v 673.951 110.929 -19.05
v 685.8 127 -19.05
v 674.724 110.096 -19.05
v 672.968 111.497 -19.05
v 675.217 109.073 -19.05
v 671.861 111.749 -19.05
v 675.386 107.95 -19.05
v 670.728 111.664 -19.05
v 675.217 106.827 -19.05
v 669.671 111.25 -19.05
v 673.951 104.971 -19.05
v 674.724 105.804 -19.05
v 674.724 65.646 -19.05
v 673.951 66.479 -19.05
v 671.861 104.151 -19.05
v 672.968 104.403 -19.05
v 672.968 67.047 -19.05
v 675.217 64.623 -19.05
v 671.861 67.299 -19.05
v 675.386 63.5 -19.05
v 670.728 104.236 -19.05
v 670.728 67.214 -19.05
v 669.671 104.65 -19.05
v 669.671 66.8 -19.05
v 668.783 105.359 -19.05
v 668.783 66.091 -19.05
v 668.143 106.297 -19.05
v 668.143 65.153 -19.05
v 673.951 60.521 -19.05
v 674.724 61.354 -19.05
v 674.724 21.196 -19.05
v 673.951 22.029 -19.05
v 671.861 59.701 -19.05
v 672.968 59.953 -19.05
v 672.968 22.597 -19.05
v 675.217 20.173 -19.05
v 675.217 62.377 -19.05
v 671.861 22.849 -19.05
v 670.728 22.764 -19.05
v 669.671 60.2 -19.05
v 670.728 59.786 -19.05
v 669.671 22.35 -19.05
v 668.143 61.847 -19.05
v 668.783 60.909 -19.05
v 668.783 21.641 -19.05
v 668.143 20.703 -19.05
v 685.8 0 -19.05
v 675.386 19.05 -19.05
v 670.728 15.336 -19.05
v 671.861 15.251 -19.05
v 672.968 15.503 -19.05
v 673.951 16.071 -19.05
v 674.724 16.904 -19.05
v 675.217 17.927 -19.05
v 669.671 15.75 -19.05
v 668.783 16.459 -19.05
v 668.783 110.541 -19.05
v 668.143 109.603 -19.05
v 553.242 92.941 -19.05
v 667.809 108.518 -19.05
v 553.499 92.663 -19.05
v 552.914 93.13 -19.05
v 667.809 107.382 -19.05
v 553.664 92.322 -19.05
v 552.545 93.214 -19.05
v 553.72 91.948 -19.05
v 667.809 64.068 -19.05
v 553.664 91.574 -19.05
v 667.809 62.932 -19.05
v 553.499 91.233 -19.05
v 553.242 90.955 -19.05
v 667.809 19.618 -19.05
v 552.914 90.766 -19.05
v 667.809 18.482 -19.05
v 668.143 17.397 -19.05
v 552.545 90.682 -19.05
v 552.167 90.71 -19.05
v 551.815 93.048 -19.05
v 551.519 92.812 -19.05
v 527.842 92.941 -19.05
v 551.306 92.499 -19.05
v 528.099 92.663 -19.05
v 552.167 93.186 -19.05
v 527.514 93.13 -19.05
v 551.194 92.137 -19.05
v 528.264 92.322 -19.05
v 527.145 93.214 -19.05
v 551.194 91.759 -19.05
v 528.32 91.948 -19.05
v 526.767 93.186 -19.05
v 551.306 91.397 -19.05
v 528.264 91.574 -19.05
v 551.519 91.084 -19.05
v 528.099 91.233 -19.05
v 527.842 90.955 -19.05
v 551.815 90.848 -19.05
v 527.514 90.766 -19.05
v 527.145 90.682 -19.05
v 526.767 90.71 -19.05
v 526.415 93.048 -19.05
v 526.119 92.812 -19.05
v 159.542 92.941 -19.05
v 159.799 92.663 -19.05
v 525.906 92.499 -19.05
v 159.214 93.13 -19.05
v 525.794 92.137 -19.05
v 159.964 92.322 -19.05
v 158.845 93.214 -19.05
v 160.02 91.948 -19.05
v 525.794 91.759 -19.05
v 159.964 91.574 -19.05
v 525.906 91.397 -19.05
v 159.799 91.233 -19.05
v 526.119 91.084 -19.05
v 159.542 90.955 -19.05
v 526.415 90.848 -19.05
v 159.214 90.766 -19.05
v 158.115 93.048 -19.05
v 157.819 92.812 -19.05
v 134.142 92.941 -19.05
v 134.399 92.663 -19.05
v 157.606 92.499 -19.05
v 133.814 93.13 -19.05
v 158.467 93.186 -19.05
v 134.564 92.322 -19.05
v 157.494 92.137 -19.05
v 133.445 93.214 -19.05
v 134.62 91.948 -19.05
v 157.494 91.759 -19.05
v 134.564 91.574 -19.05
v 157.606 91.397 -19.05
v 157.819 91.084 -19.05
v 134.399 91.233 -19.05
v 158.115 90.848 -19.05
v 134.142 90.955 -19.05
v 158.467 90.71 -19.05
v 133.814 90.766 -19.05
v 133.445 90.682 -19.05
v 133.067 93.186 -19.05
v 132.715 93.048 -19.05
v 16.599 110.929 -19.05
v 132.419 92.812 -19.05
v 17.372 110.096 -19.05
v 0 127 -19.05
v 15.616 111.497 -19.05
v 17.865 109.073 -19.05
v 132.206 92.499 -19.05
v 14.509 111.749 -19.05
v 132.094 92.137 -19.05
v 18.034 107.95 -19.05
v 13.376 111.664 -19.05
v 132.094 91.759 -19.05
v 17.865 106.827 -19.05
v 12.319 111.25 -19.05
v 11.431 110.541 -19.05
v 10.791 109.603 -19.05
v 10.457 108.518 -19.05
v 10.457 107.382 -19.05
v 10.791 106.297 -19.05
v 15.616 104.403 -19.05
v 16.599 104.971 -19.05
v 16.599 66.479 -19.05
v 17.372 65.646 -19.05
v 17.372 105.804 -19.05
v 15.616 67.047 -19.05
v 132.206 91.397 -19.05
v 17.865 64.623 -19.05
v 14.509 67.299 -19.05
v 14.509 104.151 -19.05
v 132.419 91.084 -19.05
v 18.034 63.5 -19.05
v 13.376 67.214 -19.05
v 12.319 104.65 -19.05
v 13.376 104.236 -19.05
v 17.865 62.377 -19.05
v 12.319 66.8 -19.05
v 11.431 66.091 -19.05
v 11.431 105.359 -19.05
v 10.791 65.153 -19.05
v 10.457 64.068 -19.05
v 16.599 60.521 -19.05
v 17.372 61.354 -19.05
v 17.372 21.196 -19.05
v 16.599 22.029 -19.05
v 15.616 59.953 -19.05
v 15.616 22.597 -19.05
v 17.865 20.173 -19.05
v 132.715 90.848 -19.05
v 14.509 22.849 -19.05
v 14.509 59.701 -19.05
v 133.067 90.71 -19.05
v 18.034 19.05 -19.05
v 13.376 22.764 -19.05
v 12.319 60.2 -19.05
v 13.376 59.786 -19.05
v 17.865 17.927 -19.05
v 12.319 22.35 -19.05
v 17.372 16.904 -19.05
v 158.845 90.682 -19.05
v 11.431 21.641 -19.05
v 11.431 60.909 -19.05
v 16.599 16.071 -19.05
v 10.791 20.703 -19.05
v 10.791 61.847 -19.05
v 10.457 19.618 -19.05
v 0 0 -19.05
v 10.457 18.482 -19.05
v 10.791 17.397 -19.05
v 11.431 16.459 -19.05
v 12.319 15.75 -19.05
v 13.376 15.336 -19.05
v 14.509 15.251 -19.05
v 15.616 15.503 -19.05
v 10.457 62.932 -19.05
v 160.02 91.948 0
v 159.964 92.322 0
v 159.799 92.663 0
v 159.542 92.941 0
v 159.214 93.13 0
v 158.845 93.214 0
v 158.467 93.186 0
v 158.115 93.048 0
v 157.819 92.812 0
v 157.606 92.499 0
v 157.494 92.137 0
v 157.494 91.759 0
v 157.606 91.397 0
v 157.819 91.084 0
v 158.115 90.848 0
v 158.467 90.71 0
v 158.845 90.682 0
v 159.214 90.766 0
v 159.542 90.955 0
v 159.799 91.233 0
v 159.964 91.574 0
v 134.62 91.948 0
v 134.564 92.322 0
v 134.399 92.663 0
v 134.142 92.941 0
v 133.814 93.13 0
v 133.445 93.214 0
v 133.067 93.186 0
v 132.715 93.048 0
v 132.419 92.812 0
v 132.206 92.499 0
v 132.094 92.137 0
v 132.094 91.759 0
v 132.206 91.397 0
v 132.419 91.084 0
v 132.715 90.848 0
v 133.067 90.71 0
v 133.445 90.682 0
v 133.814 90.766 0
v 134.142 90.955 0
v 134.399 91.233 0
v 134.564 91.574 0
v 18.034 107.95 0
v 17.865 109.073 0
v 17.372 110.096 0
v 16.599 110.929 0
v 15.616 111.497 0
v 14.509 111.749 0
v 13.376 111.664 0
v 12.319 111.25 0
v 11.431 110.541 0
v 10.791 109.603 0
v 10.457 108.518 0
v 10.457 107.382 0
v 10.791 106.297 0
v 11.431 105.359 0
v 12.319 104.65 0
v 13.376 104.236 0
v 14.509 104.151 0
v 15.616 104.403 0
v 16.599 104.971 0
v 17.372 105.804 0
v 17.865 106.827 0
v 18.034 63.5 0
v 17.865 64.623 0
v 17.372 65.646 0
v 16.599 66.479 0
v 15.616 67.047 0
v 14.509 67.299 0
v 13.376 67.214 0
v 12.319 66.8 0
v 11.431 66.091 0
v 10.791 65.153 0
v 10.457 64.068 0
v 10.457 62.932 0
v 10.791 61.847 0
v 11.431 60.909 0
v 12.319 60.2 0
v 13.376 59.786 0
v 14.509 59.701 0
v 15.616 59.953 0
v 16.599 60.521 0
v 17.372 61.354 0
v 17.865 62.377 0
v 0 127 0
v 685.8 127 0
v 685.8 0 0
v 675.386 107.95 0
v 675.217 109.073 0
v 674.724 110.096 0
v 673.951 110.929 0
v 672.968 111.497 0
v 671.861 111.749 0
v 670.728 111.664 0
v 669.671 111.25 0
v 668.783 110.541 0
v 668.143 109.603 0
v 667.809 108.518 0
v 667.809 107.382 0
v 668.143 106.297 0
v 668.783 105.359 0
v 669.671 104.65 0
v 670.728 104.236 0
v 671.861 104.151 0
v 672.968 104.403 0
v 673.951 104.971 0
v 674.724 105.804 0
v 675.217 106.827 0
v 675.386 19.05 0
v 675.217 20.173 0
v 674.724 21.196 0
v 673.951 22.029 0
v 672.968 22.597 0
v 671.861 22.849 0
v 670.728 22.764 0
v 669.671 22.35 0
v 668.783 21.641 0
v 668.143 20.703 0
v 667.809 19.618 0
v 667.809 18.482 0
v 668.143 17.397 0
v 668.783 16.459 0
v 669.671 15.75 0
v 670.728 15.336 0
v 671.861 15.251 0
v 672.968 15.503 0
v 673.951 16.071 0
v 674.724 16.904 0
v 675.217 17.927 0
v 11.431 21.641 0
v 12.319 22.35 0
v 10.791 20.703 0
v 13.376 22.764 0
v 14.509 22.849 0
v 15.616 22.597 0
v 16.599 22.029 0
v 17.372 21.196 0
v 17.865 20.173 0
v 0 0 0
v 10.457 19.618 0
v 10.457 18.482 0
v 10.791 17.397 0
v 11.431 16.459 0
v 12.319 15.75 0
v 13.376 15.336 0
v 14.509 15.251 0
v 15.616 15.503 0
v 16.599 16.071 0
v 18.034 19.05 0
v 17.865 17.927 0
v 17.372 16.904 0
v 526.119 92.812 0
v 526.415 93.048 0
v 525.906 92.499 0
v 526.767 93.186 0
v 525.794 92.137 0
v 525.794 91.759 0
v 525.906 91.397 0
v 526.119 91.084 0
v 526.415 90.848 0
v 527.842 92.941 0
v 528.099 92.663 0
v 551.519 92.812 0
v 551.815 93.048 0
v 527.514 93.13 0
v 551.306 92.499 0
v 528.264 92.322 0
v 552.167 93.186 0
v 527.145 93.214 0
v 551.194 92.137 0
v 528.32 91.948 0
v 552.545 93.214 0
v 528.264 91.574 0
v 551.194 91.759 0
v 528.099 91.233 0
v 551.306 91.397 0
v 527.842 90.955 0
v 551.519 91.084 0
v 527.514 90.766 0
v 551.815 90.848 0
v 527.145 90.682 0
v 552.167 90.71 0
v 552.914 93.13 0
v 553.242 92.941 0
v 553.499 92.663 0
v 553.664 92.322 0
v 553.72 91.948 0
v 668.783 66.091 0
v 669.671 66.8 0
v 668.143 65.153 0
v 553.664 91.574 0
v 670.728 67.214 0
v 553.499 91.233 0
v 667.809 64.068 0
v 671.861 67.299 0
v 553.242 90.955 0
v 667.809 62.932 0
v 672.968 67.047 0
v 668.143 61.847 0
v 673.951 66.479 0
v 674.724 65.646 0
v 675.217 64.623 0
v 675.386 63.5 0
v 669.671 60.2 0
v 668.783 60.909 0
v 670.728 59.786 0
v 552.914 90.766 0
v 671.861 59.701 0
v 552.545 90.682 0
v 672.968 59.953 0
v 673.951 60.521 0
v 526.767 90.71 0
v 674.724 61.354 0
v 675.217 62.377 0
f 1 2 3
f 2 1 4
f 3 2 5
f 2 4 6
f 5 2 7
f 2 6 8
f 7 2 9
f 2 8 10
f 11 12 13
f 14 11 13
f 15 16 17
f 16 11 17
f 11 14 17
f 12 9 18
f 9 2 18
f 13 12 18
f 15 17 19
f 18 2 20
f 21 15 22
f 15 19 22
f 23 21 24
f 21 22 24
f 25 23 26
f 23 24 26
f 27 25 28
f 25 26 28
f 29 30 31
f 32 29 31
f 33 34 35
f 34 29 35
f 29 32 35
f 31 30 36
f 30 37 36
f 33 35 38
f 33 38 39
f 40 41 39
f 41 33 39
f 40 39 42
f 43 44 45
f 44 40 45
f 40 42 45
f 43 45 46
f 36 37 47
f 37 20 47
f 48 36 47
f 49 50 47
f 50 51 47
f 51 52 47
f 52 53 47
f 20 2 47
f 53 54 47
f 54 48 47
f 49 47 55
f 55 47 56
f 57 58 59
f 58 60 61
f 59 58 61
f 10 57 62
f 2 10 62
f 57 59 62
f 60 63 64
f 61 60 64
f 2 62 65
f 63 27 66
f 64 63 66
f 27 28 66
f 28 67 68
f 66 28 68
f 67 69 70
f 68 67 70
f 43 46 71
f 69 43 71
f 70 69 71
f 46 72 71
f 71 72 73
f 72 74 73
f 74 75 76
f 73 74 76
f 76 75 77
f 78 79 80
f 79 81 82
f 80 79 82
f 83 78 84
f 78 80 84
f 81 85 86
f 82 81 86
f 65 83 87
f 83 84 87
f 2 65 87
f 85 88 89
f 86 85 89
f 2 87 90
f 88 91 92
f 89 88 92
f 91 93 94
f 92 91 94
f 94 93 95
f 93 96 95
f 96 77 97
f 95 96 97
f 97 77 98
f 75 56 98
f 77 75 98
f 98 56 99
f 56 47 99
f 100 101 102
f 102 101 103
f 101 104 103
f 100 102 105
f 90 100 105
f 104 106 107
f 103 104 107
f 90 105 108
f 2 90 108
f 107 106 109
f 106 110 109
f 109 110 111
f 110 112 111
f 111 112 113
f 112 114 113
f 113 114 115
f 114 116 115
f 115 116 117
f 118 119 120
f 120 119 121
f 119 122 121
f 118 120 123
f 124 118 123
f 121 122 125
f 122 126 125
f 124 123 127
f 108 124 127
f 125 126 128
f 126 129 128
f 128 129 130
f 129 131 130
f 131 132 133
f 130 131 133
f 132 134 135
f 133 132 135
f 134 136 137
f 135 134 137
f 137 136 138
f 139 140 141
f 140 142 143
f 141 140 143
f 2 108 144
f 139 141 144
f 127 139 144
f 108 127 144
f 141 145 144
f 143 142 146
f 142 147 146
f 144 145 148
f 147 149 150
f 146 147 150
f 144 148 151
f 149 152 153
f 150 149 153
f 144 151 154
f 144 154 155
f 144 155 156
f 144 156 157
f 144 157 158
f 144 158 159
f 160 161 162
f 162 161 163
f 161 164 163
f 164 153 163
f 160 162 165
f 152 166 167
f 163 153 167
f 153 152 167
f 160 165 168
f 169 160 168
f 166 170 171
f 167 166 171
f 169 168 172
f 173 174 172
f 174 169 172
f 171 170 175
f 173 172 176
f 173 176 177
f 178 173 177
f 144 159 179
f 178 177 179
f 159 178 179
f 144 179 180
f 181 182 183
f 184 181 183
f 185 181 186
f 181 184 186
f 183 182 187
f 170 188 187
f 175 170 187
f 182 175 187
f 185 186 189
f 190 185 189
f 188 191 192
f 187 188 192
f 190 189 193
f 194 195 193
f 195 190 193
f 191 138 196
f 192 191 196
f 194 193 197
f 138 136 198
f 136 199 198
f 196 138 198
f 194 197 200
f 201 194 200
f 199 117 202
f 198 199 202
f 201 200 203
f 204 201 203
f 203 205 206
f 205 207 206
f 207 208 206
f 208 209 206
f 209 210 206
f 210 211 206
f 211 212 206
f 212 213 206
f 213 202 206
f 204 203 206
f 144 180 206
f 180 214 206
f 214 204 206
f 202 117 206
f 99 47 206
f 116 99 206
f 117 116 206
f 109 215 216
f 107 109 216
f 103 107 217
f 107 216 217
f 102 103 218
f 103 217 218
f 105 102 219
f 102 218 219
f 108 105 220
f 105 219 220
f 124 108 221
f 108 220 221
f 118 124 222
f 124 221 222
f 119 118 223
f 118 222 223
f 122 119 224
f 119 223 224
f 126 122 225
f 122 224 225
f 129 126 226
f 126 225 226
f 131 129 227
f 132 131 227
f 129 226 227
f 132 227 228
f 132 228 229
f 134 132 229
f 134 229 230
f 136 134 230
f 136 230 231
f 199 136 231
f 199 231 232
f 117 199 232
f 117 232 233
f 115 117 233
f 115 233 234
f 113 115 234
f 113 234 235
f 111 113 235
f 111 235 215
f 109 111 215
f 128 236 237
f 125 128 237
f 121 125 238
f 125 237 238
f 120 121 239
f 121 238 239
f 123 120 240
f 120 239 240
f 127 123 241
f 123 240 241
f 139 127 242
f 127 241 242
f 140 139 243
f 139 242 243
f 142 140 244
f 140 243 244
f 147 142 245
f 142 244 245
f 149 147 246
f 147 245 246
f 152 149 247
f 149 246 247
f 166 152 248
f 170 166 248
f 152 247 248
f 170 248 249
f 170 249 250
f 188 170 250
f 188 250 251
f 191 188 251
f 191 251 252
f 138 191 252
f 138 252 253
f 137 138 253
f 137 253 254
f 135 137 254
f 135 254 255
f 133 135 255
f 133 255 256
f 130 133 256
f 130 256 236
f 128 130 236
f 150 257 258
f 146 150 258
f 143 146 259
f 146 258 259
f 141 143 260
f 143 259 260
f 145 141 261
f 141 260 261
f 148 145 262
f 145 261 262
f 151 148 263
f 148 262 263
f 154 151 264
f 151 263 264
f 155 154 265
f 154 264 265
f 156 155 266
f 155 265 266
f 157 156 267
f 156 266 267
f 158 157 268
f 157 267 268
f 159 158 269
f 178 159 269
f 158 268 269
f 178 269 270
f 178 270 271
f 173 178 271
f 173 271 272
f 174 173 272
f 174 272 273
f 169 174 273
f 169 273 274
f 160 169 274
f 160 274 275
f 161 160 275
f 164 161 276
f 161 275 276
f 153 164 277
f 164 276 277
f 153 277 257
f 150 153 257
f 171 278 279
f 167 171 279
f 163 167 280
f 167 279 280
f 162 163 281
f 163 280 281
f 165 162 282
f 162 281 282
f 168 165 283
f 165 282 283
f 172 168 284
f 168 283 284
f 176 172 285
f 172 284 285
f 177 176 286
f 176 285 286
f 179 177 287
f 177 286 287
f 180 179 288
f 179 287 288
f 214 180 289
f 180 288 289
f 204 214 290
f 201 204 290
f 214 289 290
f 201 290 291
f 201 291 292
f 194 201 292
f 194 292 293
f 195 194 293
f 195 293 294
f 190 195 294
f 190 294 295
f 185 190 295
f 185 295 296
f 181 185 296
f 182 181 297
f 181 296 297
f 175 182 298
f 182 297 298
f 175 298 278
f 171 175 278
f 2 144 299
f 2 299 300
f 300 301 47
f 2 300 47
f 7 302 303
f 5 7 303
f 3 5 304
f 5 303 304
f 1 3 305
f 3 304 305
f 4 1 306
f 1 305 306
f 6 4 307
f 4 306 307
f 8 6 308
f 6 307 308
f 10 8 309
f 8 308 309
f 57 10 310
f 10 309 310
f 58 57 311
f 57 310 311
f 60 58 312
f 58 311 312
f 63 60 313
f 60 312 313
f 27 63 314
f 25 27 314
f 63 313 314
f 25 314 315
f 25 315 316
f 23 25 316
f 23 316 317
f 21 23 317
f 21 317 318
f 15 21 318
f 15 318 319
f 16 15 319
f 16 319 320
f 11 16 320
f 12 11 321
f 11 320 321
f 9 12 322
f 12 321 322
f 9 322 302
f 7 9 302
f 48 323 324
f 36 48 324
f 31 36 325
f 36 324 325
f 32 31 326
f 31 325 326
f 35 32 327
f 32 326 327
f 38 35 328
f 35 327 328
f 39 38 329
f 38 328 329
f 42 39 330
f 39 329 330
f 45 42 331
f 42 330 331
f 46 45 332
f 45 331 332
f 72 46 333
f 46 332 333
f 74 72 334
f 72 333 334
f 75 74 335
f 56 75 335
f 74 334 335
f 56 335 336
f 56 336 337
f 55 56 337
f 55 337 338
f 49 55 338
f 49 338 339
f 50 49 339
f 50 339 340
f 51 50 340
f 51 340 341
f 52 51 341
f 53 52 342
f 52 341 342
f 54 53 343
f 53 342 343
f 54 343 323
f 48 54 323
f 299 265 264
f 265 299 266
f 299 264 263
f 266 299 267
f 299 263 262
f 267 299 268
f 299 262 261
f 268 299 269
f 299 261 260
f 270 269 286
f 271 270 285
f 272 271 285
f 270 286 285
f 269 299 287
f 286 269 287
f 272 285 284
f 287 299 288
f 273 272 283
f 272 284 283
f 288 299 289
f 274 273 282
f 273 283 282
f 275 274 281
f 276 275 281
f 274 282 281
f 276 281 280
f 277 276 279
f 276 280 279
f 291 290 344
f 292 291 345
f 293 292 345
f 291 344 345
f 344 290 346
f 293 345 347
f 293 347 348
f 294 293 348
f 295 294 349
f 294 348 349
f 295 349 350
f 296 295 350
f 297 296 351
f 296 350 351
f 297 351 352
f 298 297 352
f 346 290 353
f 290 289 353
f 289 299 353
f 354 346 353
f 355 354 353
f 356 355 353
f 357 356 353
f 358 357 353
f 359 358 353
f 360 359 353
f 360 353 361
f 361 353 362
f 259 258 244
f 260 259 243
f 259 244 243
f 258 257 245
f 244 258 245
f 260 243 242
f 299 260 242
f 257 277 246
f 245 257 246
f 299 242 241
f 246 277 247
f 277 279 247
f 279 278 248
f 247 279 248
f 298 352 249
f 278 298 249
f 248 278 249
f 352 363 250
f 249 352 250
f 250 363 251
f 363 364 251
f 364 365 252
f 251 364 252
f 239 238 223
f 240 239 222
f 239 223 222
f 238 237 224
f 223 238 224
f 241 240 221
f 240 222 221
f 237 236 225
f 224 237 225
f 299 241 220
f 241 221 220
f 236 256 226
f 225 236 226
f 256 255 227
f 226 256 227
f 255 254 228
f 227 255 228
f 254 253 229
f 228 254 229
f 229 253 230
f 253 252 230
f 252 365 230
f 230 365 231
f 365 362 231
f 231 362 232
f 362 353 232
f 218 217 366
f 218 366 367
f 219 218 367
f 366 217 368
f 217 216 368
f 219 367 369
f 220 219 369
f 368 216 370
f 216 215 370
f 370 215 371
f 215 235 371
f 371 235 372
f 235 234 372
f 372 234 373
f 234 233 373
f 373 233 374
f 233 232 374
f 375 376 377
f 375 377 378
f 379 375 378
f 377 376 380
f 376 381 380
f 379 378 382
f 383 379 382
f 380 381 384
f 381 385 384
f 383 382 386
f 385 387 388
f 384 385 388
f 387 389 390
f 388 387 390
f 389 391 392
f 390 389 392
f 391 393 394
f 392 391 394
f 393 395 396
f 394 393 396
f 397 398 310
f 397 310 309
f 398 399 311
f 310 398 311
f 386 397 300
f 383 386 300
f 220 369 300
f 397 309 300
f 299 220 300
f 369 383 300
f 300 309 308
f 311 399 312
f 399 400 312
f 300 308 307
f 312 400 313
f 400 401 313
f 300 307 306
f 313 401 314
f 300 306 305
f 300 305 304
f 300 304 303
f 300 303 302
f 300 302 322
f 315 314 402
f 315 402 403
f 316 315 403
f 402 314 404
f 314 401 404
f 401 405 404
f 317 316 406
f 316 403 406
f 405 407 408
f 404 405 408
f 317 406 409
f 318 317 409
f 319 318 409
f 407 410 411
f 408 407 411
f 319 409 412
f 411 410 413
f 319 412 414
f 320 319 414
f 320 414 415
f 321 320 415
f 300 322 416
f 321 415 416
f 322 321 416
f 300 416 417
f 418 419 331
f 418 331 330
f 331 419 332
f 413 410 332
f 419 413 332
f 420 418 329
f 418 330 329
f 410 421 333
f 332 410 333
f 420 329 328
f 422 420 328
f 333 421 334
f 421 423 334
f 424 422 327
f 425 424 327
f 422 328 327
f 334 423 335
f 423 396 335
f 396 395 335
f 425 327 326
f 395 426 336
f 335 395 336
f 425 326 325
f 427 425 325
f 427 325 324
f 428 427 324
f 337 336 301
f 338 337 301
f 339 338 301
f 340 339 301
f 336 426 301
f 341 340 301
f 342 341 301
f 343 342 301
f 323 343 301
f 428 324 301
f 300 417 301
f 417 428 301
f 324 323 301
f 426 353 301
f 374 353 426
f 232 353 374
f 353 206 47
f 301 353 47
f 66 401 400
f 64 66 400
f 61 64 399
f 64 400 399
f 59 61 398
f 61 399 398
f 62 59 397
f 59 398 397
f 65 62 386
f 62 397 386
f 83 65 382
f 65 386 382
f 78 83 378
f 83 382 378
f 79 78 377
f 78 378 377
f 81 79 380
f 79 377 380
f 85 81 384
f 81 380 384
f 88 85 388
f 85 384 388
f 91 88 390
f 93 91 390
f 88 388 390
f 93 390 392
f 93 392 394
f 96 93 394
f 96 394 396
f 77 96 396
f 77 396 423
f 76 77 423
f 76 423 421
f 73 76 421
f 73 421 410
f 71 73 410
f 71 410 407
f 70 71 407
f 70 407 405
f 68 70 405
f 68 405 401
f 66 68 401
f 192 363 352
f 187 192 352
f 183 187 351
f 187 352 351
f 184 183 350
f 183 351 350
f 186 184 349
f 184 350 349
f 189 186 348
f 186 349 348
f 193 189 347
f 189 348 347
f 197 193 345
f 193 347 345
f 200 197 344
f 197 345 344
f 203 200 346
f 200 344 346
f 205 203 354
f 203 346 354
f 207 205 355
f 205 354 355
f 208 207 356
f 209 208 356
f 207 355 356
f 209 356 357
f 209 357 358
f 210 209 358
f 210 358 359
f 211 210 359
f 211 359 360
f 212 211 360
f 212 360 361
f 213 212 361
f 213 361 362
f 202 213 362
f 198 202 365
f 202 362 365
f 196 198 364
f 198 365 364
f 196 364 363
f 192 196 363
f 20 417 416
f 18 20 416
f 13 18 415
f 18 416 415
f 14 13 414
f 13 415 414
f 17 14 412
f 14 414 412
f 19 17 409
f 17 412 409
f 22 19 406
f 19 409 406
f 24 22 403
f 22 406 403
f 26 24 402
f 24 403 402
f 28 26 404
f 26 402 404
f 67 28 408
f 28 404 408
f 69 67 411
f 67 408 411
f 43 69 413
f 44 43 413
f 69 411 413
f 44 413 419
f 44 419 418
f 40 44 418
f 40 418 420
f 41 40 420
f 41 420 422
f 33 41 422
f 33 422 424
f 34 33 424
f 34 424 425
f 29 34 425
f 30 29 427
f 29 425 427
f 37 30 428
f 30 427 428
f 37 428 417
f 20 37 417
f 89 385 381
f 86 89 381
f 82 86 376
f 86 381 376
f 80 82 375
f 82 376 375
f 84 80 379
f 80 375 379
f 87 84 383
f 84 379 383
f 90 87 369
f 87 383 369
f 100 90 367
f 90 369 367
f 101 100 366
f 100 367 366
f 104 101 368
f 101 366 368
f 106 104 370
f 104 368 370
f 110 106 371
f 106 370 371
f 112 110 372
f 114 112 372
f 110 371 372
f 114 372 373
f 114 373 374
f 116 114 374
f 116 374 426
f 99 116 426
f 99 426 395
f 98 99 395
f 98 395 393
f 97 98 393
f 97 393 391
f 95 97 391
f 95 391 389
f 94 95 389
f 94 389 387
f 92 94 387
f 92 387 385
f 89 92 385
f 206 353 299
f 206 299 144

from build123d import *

# Parameters (mm, degrees)
SKETCH3_W           = 647.7
SKETCH3_H           = 19.05
SKETCH3_W_2         = 19.05
BOSS_EXTRUDE1_DEPTH = 127
SKETCH4_R           = 3.81
CUT_EXTRUDE1_DEPTH  = 19.05
SKETCH5_R           = 1.27
CUT_EXTRUDE2_DEPTH  = 114.3


with BuildPart() as part:
    # Sketch3 → Boss-Extrude1 (new body)
    with BuildSketch(Plane(origin=(0, 0, 0), x_dir=(1, 0, 0), z_dir=(0, 1, 0))):
        with Locations((342.9, 9.525)):
            Rectangle(SKETCH3_W, SKETCH3_H)
        with Locations((9.525, 9.525)):
            Rectangle(SKETCH3_W_2, SKETCH3_H)
        with Locations((676.275, 9.525)):
            Rectangle(SKETCH3_W_2, SKETCH3_H)
    extrude(amount=BOSS_EXTRUDE1_DEPTH)

    # Sketch4 → Cut-Extrude1 (cut)
    with BuildSketch(Plane.XY):
        with Locations((671.576, 107.95)):
            Circle(SKETCH4_R)
        with Locations((671.576, 63.5)):
            Circle(SKETCH4_R)
        with Locations((671.576, 19.05)):
            Circle(SKETCH4_R)
        with Locations((14.224, 63.5)):
            Circle(SKETCH4_R)
        with Locations((14.224, 107.95)):
            Circle(SKETCH4_R)
        with Locations((14.224, 19.05)):
            Circle(SKETCH4_R)
    extrude(amount=-CUT_EXTRUDE1_DEPTH, mode=Mode.SUBTRACT)

    # Sketch5 → Cut-Extrude2 (cut)
    with BuildSketch(Plane.XY):
        with Locations((133.35, 91.948)):
            Circle(SKETCH5_R)
        with Locations((158.75, 91.948)):
            Circle(SKETCH5_R)
        with Locations((527.05, 91.948)):
            Circle(SKETCH5_R)
        with Locations((552.45, 91.948)):
            Circle(SKETCH5_R)
    extrude(amount=-CUT_EXTRUDE2_DEPTH, mode=Mode.SUBTRACT)


solid = part.part
